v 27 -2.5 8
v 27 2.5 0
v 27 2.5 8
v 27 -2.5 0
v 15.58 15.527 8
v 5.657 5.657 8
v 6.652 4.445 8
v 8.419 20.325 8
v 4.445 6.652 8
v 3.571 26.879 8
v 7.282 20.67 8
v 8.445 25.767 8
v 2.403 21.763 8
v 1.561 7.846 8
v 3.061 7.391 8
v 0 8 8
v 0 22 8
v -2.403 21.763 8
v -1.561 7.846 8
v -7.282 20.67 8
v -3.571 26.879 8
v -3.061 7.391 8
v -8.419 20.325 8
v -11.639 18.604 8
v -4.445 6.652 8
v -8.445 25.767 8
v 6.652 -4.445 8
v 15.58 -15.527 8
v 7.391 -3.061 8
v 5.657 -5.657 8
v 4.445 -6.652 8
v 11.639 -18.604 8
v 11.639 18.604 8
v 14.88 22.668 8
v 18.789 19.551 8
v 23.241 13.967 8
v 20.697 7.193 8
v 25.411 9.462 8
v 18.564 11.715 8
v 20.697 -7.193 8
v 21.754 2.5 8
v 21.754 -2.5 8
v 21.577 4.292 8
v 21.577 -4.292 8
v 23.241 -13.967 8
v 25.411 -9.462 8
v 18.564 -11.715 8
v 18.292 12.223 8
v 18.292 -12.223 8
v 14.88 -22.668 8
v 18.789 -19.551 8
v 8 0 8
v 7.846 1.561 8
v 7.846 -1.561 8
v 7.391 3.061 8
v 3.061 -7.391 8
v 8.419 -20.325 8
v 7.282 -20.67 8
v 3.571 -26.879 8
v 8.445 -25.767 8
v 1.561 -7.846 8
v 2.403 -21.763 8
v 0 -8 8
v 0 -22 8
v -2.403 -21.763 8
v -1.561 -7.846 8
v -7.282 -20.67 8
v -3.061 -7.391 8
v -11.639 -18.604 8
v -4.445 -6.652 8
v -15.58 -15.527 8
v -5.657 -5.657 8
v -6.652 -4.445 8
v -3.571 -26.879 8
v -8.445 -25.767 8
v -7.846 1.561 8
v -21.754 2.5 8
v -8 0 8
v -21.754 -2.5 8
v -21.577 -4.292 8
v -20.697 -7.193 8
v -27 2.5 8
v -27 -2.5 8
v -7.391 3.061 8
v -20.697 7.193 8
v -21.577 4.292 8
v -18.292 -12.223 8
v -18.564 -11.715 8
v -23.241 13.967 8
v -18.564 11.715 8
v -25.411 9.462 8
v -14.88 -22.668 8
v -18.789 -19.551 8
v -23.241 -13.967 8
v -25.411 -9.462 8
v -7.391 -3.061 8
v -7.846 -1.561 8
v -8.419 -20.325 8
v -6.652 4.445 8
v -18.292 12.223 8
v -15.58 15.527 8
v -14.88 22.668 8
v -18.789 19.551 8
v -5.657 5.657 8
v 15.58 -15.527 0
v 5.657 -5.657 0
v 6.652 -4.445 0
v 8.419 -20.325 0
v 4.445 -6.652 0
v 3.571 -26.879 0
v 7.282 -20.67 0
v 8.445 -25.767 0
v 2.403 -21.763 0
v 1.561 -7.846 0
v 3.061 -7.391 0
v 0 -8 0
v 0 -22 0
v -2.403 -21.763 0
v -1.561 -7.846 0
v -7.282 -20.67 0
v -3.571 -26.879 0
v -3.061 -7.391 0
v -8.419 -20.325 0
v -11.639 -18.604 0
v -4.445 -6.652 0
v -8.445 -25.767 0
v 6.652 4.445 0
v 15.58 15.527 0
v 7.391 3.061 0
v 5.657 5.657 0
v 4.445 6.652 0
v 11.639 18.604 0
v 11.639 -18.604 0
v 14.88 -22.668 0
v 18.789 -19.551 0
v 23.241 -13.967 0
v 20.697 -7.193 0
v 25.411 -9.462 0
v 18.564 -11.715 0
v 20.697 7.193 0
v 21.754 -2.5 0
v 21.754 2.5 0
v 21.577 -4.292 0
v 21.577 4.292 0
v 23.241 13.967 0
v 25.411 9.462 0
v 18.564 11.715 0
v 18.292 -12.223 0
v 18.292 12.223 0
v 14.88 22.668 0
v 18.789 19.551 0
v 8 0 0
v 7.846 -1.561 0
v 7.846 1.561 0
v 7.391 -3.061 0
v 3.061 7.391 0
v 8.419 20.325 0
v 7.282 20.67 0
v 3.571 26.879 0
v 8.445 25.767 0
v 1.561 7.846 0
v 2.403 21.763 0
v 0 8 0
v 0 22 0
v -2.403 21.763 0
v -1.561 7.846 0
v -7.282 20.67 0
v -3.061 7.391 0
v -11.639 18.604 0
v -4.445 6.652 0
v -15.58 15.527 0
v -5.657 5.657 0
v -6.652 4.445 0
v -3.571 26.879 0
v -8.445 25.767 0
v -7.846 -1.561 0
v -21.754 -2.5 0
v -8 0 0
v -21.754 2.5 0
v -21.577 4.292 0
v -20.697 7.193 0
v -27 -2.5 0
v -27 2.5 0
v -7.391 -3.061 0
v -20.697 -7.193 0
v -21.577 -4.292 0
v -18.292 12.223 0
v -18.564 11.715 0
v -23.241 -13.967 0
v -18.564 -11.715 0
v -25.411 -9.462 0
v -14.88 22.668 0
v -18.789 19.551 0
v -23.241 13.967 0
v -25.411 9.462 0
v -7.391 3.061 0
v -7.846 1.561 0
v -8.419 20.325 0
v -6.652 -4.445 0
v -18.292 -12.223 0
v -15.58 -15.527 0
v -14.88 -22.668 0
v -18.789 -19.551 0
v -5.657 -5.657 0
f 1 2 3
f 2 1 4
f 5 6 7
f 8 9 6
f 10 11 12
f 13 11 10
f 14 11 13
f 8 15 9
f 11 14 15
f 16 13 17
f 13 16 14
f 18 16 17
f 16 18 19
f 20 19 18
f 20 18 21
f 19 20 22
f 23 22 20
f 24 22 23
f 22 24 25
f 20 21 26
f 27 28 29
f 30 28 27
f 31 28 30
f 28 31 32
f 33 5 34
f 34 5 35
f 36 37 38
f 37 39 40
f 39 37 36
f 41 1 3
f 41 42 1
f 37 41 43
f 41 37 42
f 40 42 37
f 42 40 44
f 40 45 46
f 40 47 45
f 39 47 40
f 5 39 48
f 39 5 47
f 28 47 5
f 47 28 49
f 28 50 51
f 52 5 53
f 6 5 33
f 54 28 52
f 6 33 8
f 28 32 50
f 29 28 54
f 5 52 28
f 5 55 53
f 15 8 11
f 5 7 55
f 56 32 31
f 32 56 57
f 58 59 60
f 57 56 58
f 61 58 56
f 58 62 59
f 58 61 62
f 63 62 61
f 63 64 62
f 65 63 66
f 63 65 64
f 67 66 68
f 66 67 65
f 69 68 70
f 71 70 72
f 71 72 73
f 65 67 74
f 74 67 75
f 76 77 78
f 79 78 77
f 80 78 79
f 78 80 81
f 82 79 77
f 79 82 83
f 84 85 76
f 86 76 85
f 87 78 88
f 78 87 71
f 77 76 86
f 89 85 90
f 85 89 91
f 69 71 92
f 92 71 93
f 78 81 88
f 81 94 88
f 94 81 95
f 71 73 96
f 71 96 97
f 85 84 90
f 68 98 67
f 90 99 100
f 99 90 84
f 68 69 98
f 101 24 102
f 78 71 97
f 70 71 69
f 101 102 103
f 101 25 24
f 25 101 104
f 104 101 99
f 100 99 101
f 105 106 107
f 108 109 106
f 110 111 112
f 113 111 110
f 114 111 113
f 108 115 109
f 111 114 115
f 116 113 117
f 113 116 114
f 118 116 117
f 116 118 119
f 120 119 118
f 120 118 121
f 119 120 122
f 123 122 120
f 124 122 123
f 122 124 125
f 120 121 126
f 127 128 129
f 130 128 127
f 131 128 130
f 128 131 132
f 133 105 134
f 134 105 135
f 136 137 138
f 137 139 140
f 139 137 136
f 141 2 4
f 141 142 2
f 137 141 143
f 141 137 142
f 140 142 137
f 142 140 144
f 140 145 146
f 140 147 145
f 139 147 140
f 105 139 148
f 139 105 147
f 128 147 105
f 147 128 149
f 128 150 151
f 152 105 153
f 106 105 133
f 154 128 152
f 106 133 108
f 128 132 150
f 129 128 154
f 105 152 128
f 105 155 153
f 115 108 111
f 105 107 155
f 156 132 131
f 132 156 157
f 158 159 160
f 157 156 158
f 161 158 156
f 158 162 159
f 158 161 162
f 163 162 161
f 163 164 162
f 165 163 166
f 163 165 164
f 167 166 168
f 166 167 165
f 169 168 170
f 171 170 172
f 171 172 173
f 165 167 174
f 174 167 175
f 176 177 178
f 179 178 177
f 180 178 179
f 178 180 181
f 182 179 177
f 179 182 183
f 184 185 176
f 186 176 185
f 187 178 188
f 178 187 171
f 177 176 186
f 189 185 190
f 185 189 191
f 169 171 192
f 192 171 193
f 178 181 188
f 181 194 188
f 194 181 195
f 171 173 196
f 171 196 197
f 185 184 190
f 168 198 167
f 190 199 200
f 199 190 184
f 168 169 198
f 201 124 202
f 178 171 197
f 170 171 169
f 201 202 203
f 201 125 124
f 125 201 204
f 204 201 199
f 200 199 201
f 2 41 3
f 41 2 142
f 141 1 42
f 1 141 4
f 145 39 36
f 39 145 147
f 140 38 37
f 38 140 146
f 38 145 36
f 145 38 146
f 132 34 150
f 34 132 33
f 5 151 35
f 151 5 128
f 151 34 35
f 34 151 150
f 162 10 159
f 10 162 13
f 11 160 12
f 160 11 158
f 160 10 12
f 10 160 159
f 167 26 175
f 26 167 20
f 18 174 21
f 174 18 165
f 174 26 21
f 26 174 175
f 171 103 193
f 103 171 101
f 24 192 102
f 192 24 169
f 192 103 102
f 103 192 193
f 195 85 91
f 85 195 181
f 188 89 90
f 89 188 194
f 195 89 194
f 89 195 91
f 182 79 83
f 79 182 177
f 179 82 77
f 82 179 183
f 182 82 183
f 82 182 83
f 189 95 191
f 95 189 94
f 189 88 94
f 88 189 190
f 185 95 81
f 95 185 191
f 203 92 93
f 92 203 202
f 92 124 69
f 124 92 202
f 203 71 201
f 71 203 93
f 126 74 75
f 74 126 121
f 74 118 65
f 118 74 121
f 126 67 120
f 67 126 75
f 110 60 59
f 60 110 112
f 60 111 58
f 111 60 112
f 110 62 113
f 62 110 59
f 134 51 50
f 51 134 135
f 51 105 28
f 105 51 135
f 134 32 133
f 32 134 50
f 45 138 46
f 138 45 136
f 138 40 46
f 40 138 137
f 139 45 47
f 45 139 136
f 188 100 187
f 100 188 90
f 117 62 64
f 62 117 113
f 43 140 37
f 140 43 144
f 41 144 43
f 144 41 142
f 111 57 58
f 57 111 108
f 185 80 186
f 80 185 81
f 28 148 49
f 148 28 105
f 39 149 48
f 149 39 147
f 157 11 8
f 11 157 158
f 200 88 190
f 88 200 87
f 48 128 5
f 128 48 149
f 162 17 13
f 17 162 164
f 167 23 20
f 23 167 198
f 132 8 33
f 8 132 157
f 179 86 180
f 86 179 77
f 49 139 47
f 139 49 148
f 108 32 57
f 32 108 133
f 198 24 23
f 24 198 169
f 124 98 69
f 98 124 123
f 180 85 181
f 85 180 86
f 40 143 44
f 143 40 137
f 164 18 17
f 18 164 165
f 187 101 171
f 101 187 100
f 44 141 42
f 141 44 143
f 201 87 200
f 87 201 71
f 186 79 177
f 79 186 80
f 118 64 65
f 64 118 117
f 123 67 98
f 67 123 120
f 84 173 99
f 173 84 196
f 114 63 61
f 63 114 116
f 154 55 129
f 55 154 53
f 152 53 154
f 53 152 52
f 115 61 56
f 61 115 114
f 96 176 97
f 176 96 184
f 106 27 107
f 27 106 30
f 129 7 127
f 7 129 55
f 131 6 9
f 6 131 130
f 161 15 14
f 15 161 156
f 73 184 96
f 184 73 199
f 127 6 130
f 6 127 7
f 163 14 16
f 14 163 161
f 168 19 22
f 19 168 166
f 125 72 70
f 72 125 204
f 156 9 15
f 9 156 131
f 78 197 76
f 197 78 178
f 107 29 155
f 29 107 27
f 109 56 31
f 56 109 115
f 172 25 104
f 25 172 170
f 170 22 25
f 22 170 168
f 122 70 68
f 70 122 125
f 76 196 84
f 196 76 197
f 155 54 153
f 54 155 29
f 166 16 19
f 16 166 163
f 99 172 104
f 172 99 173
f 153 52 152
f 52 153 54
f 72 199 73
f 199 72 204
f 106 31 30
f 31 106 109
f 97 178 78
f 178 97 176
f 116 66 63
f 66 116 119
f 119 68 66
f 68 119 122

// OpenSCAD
$fn = 32;

// ----------------------------------------------------------------------
// Spur blank: bored gear blank
// ----------------------------------------------------------------------

// --- parameters (mm) ---
disc_r = 22;              // blank root radius
disc_t = 8;               // blank thickness
n_teeth = 14;             // stub tooth count
tooth_w = 5;              // tooth width at the root
tooth_h = 5;              // tooth height above the root
bore_r = 8;               // central bore radius

out_r = disc_r + tooth_h;  // tip radius
bbox_x = 54.0;  // measured width over the teeth
bbox_y = 53.76;  // measured depth over the teeth

difference() {
union() {
  cylinder(r = disc_r, h = disc_t);
  for (i = [0 : n_teeth - 1])
    rotate([0, 0, i * 360 / n_teeth])
      translate([disc_r - 1, -tooth_w / 2, 0])
        cube([tooth_h + 1, tooth_w, disc_t]);
}
  translate([0, 0, -1]) cylinder(r = bore_r, h = disc_t + 2);
}
